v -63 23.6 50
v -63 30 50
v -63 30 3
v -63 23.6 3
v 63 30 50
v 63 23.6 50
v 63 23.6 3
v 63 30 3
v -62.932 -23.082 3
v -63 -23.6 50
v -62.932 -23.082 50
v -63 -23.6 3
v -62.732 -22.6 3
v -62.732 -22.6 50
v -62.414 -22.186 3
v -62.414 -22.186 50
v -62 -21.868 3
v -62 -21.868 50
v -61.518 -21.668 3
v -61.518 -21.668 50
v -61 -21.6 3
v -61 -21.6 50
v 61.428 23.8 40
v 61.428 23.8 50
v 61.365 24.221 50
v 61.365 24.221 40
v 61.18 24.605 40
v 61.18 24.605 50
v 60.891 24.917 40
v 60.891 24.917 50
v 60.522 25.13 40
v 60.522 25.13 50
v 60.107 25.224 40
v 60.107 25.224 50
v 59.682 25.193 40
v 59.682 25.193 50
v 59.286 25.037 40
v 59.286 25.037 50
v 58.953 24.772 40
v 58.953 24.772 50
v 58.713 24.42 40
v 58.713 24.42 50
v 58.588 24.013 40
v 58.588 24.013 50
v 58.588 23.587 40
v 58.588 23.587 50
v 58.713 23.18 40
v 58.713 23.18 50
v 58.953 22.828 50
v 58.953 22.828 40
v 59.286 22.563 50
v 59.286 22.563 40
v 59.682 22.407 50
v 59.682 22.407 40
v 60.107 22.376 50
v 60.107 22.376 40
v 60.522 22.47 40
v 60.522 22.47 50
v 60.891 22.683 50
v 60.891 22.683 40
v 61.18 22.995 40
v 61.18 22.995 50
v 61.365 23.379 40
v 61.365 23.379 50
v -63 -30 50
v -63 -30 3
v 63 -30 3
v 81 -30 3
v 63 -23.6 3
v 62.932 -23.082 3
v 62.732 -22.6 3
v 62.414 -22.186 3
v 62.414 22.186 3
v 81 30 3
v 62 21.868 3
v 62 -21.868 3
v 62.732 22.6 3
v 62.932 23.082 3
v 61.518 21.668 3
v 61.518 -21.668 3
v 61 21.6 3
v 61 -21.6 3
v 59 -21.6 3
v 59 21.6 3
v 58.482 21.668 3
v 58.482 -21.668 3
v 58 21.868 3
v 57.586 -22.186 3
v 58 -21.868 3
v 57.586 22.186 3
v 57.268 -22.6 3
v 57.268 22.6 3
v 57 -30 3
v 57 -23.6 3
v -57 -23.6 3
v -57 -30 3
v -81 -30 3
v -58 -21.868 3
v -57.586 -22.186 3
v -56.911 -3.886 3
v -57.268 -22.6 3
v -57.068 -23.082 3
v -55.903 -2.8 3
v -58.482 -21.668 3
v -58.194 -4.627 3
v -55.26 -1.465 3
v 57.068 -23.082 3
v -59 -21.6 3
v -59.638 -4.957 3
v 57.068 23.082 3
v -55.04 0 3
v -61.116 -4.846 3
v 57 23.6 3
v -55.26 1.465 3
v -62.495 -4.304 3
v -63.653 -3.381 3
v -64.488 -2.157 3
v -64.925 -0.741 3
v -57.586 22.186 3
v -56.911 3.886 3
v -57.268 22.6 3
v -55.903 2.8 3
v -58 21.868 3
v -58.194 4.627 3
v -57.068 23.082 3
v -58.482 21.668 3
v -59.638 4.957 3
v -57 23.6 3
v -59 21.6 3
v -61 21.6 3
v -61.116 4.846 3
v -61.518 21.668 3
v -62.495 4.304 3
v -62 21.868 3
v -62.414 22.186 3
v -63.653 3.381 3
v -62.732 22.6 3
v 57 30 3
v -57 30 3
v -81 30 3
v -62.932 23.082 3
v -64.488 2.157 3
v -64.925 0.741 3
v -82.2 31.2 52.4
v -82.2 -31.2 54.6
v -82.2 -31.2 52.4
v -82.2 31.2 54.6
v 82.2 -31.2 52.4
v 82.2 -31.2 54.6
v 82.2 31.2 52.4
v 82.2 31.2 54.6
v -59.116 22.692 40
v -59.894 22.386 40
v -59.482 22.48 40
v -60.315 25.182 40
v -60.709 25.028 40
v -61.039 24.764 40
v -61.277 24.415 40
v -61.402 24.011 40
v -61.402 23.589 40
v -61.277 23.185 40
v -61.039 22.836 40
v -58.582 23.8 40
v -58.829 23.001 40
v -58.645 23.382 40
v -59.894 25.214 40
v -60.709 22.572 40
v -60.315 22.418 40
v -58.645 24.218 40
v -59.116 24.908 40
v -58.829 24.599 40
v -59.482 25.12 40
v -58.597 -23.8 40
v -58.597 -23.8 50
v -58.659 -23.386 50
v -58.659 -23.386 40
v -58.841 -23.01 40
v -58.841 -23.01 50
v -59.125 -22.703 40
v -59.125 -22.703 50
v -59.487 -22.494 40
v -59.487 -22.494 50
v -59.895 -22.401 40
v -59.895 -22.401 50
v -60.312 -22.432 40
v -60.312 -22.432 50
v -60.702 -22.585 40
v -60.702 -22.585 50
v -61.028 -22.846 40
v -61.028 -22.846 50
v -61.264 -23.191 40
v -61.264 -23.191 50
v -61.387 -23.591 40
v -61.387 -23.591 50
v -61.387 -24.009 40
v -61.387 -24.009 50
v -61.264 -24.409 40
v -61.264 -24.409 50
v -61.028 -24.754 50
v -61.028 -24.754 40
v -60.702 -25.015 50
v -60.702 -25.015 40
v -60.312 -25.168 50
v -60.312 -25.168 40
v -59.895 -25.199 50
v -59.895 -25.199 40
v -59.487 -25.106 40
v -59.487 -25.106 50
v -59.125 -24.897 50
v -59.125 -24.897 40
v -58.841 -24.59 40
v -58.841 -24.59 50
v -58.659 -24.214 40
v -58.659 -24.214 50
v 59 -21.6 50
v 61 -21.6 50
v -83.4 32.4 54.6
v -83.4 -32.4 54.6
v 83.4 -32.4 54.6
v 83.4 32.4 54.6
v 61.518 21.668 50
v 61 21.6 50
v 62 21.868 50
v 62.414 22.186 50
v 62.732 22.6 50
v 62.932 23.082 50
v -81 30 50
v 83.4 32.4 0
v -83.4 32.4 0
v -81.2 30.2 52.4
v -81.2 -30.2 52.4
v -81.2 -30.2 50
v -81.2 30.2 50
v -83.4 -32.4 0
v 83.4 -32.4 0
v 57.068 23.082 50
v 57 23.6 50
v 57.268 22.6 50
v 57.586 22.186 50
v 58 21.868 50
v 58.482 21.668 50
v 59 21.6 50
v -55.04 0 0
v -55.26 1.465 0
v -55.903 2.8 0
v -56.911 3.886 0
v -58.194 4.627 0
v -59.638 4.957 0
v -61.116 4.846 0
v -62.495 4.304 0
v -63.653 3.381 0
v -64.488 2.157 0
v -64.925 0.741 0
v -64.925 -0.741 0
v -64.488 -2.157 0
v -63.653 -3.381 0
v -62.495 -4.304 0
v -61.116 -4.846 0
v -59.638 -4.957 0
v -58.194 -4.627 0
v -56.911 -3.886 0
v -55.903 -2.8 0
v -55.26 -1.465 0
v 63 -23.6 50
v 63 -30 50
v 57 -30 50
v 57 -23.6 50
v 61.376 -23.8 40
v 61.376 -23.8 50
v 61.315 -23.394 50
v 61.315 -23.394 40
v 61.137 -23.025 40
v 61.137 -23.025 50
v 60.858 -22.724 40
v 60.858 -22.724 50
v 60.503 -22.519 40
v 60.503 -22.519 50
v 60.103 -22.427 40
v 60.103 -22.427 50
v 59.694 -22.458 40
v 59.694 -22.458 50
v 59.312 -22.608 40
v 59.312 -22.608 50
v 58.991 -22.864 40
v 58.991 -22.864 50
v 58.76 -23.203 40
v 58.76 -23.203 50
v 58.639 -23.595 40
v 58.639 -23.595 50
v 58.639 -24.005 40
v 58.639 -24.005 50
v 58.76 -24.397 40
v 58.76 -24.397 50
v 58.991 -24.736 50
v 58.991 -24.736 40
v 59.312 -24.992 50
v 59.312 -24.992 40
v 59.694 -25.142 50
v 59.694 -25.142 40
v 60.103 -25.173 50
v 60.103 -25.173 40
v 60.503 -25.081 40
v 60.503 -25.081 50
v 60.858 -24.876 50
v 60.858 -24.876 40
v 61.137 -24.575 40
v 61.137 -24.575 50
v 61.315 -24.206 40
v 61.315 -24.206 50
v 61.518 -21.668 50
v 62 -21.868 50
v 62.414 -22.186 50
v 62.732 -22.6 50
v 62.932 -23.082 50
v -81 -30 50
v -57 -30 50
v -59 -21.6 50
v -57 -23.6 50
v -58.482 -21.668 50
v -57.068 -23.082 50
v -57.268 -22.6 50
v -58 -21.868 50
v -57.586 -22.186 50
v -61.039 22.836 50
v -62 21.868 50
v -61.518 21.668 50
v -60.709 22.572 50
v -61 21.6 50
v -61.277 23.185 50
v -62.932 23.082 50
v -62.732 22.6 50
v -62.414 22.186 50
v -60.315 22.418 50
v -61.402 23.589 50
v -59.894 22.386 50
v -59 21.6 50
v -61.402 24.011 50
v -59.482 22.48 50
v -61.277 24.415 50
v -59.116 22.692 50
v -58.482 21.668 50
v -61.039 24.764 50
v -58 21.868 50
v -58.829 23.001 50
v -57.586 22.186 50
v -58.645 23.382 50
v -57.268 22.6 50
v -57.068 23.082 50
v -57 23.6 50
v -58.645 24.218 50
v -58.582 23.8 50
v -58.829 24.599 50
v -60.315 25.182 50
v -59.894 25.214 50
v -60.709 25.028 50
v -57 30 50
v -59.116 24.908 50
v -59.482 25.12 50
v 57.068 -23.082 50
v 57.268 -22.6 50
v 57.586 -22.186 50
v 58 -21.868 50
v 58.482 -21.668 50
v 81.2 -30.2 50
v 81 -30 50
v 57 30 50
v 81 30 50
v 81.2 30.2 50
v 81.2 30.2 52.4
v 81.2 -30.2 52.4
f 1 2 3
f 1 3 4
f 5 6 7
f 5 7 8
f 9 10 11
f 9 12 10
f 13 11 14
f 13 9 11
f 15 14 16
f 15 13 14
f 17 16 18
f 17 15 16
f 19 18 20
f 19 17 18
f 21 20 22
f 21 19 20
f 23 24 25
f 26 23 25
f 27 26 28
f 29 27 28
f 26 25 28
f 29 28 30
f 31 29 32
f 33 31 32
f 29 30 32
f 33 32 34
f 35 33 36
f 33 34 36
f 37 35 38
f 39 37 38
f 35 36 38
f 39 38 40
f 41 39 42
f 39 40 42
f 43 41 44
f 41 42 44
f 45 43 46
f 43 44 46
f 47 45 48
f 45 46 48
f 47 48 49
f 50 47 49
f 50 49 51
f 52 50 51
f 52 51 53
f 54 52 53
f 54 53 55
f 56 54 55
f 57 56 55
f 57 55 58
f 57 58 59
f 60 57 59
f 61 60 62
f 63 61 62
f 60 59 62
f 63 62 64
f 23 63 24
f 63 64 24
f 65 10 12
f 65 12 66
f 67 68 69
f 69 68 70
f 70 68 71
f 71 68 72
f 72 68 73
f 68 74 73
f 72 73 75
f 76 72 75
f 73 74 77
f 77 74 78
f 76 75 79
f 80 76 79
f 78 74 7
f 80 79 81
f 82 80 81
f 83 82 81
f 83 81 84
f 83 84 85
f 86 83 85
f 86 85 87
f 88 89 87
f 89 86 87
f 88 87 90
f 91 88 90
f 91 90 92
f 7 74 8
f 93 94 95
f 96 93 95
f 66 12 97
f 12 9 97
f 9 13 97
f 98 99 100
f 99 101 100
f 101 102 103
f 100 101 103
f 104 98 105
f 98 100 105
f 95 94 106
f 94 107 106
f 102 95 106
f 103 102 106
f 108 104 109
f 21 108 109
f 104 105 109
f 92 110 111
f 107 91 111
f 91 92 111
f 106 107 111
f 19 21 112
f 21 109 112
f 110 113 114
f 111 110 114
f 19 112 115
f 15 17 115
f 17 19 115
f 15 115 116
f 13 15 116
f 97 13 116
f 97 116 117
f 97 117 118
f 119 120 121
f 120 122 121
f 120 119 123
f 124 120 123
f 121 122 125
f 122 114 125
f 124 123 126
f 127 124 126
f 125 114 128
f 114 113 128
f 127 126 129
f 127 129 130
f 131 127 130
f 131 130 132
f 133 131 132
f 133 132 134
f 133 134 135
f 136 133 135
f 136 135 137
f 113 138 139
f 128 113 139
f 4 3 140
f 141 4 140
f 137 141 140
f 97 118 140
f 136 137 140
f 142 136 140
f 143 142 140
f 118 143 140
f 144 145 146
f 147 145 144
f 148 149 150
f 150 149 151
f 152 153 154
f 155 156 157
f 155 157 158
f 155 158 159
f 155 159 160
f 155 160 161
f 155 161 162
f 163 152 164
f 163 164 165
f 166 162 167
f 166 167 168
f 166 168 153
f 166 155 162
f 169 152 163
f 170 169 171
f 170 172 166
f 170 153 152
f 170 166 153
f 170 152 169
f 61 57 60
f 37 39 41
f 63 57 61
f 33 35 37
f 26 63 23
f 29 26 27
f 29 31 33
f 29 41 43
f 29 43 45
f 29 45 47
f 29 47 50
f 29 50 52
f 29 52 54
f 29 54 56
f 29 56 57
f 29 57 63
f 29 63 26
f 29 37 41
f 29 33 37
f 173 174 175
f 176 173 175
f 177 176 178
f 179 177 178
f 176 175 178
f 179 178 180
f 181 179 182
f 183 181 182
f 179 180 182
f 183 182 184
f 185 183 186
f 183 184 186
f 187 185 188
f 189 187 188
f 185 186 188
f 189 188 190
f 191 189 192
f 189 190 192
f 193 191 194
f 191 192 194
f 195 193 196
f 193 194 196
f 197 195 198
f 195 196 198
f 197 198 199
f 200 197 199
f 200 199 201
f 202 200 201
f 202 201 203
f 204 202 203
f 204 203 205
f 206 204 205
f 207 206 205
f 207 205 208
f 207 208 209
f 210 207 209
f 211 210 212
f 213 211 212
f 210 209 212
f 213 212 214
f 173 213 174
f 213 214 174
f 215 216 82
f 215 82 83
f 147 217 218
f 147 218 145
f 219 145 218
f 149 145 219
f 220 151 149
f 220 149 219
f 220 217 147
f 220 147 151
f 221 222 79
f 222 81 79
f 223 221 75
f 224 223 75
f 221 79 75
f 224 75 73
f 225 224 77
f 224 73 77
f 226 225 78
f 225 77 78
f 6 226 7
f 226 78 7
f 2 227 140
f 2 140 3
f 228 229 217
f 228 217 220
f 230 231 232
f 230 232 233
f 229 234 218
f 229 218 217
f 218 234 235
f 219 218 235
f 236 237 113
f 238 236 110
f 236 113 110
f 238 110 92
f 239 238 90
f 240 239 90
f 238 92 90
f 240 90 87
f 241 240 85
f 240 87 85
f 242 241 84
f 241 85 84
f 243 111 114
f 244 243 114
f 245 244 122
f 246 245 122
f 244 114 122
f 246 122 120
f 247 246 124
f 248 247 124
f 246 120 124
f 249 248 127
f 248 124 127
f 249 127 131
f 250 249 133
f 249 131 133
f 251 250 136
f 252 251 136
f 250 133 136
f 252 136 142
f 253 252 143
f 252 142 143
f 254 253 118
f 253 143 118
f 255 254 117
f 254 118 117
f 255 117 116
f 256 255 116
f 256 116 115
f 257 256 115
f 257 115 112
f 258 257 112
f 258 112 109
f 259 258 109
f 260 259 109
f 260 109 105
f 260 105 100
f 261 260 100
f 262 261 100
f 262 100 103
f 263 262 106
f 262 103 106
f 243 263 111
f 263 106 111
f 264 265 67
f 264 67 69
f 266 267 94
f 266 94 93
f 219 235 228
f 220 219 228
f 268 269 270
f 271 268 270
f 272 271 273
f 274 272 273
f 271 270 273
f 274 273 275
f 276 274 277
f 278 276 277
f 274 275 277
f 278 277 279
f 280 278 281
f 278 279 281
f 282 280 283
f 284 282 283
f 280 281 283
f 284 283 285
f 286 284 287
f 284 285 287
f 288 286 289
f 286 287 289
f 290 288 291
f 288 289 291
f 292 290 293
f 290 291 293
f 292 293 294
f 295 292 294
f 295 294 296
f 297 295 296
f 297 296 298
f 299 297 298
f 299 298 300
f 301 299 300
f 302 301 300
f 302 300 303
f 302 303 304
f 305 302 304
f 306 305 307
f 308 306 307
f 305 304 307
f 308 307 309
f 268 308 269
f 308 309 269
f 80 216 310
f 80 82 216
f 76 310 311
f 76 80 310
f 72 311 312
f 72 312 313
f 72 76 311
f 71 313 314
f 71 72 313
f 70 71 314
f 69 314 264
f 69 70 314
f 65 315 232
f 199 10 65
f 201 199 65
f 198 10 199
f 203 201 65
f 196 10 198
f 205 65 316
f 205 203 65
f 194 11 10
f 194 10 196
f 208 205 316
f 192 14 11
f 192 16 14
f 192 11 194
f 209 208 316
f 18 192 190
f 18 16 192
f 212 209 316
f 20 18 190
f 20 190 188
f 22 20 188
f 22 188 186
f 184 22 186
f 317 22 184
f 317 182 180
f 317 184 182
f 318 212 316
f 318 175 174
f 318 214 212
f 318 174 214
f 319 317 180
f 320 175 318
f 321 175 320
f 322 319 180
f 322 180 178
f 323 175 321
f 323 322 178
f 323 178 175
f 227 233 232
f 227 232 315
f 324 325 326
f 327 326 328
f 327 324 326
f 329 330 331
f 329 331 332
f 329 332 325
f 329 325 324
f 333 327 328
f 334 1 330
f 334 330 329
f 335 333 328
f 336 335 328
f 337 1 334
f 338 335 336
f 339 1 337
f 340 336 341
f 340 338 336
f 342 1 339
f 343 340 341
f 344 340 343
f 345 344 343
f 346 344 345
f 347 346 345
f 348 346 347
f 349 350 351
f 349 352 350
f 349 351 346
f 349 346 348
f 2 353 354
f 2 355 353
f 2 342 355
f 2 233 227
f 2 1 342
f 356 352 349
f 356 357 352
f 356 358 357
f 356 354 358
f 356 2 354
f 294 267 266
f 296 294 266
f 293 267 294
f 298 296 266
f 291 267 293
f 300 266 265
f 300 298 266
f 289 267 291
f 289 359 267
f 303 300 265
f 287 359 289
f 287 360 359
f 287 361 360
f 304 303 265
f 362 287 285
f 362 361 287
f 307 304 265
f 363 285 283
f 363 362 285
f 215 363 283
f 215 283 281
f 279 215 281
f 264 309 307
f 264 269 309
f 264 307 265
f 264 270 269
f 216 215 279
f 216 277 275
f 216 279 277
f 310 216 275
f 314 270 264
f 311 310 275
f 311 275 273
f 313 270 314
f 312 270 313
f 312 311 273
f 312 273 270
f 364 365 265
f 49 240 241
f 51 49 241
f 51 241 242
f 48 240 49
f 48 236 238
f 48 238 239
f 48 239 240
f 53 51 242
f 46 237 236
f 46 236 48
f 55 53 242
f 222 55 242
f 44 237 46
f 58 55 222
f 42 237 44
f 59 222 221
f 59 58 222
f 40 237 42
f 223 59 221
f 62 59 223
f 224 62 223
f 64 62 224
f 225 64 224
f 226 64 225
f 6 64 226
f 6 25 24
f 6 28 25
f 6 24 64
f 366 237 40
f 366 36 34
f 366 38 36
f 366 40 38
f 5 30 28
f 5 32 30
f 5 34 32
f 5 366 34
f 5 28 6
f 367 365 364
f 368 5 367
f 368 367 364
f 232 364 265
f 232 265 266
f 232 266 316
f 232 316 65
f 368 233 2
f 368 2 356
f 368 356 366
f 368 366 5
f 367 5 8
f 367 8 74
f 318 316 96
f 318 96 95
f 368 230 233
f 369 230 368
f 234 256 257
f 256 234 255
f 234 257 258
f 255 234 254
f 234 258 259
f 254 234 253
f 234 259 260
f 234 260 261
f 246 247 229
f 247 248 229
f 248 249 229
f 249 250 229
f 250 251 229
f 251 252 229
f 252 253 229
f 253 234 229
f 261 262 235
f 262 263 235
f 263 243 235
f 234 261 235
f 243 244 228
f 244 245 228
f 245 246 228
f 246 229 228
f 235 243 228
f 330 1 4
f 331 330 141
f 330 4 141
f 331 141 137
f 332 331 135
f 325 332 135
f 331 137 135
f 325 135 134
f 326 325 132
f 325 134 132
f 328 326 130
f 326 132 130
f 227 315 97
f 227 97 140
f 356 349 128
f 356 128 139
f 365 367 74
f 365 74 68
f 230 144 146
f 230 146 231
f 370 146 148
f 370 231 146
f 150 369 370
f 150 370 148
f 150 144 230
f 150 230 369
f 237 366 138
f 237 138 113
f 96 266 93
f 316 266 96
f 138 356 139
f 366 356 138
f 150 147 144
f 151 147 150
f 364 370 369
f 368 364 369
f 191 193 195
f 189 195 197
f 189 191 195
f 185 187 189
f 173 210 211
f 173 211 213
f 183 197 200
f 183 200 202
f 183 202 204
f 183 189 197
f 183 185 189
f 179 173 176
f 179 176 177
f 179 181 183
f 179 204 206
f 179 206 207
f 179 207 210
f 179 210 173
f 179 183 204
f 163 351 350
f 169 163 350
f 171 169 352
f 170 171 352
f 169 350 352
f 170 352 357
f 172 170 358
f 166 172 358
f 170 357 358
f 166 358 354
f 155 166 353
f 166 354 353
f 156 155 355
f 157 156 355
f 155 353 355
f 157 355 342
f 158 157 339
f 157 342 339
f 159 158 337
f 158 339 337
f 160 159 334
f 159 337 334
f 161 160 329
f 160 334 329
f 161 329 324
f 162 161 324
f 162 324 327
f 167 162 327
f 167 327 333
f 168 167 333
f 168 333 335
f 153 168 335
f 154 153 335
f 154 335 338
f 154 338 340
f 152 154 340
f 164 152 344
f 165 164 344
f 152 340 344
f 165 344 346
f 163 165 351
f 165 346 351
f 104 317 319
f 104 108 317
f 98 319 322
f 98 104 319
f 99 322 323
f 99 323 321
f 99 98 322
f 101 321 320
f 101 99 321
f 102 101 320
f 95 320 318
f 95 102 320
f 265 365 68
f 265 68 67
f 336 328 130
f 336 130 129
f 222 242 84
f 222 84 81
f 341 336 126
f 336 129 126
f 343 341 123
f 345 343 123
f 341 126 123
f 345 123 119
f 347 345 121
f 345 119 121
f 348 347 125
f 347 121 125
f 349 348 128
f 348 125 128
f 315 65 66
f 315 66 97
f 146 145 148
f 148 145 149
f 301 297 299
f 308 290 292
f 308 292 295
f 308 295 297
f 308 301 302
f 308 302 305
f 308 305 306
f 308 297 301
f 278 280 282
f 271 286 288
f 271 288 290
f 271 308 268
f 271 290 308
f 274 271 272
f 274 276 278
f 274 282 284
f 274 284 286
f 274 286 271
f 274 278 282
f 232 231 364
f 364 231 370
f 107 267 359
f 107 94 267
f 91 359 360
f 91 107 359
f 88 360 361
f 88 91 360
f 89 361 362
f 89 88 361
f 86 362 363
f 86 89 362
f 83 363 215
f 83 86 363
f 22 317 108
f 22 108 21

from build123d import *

# Parameters (mm, degrees)
SKETCH_W        = 166.8
SKETCH_H        = 64.8
PAD_DEPTH       = 54.6
SKETCH001_W     = 164.4
SKETCH001_H     = 62.4
POCKET_DEPTH    = 2.2
SKETCH002_W     = 162.4
SKETCH002_H     = 60.4
POCKET001_DEPTH = 2.4
SKETCH003_R     = 1.417537
SKETCH003_R_2   = 1.403016
SKETCH003_R_3   = 1.376417
SKETCH003_R_4   = 1.428442
POCKET002_DEPTH = 10
POCKET003_DEPTH = 47
SKETCH005_R     = 4.970408
POCKET004_DEPTH = 3
FILLET_R        = 2


with BuildPart() as part:
    # Sketch → Pad (new body)
    with BuildSketch(Plane.XY):
        Rectangle(SKETCH_W, SKETCH_H)
    extrude(amount=PAD_DEPTH)

    # Sketch001 (on Face6 of Pad) → Pocket (cut)
    with BuildSketch(Plane.XY.offset(54.6)):
        Rectangle(SKETCH001_W, SKETCH001_H)
    extrude(amount=-POCKET_DEPTH, mode=Mode.SUBTRACT)

    # Sketch002 (on Face11 of Pocket) → Pocket001 (cut)
    with BuildSketch(Plane.XY.offset(52.4)):
        Rectangle(SKETCH002_W, SKETCH002_H)
    extrude(amount=-POCKET001_DEPTH, mode=Mode.SUBTRACT)

    # Sketch003 (on Face16 of Pocket001) → Pocket002 (cut)
    with BuildSketch(Plane.XY.offset(50)):
        with Locations((-60, 23.8)):
            Circle(SKETCH003_R)
        with Locations((-60, -23.8)):
            Circle(SKETCH003_R_2)
        with Locations((60, -23.8)):
            Circle(SKETCH003_R_3)
        with Locations((60, 23.8)):
            Circle(SKETCH003_R_4)
    extrude(amount=-POCKET002_DEPTH, mode=Mode.SUBTRACT)

    # Sketch004 (on Face16 of Pocket002) → Pocket003 (cut)
    with BuildSketch(Plane.XY.offset(50)):
        Polygon((-81, -30), (-81, 30), (-63, 30), (-63, 21.6), (-57, 21.6), (-57, 30), (57, 30), (57, 21.6), (63, 21.6), (63, 30), (81, 30), (81, -30), (63, -30), (63, -21.6), (57, -21.6), (57, -30), (-57, -30), (-57, -21.6), (-63, -21.6), (-63, -30), align=None)
    extrude(amount=-POCKET003_DEPTH, mode=Mode.SUBTRACT)

    # Sketch005 (on Face44 of Pocket003) → Pocket004 (cut)
    with BuildSketch(Plane.XY.offset(3)):
        with Locations((-60.009918, 0)):
            Circle(SKETCH005_R)
    extrude(amount=-POCKET004_DEPTH, mode=Mode.SUBTRACT)

    # Fillet
    fillet_edges = [part.edges().sort_by_distance(p)[0] for p in [
        (-63, 21.6, 26.5),
        (-57, 21.6, 26.5),
        (57, 21.6, 26.5),
        (63, 21.6, 26.5),
        (63, -21.6, 26.5),
        (-57, -21.6, 26.5),
        (57, -21.6, 26.5),
        (-63, -21.6, 26.5),
    ]]
    fillet(fillet_edges, radius=FILLET_R)


solid = part.part
